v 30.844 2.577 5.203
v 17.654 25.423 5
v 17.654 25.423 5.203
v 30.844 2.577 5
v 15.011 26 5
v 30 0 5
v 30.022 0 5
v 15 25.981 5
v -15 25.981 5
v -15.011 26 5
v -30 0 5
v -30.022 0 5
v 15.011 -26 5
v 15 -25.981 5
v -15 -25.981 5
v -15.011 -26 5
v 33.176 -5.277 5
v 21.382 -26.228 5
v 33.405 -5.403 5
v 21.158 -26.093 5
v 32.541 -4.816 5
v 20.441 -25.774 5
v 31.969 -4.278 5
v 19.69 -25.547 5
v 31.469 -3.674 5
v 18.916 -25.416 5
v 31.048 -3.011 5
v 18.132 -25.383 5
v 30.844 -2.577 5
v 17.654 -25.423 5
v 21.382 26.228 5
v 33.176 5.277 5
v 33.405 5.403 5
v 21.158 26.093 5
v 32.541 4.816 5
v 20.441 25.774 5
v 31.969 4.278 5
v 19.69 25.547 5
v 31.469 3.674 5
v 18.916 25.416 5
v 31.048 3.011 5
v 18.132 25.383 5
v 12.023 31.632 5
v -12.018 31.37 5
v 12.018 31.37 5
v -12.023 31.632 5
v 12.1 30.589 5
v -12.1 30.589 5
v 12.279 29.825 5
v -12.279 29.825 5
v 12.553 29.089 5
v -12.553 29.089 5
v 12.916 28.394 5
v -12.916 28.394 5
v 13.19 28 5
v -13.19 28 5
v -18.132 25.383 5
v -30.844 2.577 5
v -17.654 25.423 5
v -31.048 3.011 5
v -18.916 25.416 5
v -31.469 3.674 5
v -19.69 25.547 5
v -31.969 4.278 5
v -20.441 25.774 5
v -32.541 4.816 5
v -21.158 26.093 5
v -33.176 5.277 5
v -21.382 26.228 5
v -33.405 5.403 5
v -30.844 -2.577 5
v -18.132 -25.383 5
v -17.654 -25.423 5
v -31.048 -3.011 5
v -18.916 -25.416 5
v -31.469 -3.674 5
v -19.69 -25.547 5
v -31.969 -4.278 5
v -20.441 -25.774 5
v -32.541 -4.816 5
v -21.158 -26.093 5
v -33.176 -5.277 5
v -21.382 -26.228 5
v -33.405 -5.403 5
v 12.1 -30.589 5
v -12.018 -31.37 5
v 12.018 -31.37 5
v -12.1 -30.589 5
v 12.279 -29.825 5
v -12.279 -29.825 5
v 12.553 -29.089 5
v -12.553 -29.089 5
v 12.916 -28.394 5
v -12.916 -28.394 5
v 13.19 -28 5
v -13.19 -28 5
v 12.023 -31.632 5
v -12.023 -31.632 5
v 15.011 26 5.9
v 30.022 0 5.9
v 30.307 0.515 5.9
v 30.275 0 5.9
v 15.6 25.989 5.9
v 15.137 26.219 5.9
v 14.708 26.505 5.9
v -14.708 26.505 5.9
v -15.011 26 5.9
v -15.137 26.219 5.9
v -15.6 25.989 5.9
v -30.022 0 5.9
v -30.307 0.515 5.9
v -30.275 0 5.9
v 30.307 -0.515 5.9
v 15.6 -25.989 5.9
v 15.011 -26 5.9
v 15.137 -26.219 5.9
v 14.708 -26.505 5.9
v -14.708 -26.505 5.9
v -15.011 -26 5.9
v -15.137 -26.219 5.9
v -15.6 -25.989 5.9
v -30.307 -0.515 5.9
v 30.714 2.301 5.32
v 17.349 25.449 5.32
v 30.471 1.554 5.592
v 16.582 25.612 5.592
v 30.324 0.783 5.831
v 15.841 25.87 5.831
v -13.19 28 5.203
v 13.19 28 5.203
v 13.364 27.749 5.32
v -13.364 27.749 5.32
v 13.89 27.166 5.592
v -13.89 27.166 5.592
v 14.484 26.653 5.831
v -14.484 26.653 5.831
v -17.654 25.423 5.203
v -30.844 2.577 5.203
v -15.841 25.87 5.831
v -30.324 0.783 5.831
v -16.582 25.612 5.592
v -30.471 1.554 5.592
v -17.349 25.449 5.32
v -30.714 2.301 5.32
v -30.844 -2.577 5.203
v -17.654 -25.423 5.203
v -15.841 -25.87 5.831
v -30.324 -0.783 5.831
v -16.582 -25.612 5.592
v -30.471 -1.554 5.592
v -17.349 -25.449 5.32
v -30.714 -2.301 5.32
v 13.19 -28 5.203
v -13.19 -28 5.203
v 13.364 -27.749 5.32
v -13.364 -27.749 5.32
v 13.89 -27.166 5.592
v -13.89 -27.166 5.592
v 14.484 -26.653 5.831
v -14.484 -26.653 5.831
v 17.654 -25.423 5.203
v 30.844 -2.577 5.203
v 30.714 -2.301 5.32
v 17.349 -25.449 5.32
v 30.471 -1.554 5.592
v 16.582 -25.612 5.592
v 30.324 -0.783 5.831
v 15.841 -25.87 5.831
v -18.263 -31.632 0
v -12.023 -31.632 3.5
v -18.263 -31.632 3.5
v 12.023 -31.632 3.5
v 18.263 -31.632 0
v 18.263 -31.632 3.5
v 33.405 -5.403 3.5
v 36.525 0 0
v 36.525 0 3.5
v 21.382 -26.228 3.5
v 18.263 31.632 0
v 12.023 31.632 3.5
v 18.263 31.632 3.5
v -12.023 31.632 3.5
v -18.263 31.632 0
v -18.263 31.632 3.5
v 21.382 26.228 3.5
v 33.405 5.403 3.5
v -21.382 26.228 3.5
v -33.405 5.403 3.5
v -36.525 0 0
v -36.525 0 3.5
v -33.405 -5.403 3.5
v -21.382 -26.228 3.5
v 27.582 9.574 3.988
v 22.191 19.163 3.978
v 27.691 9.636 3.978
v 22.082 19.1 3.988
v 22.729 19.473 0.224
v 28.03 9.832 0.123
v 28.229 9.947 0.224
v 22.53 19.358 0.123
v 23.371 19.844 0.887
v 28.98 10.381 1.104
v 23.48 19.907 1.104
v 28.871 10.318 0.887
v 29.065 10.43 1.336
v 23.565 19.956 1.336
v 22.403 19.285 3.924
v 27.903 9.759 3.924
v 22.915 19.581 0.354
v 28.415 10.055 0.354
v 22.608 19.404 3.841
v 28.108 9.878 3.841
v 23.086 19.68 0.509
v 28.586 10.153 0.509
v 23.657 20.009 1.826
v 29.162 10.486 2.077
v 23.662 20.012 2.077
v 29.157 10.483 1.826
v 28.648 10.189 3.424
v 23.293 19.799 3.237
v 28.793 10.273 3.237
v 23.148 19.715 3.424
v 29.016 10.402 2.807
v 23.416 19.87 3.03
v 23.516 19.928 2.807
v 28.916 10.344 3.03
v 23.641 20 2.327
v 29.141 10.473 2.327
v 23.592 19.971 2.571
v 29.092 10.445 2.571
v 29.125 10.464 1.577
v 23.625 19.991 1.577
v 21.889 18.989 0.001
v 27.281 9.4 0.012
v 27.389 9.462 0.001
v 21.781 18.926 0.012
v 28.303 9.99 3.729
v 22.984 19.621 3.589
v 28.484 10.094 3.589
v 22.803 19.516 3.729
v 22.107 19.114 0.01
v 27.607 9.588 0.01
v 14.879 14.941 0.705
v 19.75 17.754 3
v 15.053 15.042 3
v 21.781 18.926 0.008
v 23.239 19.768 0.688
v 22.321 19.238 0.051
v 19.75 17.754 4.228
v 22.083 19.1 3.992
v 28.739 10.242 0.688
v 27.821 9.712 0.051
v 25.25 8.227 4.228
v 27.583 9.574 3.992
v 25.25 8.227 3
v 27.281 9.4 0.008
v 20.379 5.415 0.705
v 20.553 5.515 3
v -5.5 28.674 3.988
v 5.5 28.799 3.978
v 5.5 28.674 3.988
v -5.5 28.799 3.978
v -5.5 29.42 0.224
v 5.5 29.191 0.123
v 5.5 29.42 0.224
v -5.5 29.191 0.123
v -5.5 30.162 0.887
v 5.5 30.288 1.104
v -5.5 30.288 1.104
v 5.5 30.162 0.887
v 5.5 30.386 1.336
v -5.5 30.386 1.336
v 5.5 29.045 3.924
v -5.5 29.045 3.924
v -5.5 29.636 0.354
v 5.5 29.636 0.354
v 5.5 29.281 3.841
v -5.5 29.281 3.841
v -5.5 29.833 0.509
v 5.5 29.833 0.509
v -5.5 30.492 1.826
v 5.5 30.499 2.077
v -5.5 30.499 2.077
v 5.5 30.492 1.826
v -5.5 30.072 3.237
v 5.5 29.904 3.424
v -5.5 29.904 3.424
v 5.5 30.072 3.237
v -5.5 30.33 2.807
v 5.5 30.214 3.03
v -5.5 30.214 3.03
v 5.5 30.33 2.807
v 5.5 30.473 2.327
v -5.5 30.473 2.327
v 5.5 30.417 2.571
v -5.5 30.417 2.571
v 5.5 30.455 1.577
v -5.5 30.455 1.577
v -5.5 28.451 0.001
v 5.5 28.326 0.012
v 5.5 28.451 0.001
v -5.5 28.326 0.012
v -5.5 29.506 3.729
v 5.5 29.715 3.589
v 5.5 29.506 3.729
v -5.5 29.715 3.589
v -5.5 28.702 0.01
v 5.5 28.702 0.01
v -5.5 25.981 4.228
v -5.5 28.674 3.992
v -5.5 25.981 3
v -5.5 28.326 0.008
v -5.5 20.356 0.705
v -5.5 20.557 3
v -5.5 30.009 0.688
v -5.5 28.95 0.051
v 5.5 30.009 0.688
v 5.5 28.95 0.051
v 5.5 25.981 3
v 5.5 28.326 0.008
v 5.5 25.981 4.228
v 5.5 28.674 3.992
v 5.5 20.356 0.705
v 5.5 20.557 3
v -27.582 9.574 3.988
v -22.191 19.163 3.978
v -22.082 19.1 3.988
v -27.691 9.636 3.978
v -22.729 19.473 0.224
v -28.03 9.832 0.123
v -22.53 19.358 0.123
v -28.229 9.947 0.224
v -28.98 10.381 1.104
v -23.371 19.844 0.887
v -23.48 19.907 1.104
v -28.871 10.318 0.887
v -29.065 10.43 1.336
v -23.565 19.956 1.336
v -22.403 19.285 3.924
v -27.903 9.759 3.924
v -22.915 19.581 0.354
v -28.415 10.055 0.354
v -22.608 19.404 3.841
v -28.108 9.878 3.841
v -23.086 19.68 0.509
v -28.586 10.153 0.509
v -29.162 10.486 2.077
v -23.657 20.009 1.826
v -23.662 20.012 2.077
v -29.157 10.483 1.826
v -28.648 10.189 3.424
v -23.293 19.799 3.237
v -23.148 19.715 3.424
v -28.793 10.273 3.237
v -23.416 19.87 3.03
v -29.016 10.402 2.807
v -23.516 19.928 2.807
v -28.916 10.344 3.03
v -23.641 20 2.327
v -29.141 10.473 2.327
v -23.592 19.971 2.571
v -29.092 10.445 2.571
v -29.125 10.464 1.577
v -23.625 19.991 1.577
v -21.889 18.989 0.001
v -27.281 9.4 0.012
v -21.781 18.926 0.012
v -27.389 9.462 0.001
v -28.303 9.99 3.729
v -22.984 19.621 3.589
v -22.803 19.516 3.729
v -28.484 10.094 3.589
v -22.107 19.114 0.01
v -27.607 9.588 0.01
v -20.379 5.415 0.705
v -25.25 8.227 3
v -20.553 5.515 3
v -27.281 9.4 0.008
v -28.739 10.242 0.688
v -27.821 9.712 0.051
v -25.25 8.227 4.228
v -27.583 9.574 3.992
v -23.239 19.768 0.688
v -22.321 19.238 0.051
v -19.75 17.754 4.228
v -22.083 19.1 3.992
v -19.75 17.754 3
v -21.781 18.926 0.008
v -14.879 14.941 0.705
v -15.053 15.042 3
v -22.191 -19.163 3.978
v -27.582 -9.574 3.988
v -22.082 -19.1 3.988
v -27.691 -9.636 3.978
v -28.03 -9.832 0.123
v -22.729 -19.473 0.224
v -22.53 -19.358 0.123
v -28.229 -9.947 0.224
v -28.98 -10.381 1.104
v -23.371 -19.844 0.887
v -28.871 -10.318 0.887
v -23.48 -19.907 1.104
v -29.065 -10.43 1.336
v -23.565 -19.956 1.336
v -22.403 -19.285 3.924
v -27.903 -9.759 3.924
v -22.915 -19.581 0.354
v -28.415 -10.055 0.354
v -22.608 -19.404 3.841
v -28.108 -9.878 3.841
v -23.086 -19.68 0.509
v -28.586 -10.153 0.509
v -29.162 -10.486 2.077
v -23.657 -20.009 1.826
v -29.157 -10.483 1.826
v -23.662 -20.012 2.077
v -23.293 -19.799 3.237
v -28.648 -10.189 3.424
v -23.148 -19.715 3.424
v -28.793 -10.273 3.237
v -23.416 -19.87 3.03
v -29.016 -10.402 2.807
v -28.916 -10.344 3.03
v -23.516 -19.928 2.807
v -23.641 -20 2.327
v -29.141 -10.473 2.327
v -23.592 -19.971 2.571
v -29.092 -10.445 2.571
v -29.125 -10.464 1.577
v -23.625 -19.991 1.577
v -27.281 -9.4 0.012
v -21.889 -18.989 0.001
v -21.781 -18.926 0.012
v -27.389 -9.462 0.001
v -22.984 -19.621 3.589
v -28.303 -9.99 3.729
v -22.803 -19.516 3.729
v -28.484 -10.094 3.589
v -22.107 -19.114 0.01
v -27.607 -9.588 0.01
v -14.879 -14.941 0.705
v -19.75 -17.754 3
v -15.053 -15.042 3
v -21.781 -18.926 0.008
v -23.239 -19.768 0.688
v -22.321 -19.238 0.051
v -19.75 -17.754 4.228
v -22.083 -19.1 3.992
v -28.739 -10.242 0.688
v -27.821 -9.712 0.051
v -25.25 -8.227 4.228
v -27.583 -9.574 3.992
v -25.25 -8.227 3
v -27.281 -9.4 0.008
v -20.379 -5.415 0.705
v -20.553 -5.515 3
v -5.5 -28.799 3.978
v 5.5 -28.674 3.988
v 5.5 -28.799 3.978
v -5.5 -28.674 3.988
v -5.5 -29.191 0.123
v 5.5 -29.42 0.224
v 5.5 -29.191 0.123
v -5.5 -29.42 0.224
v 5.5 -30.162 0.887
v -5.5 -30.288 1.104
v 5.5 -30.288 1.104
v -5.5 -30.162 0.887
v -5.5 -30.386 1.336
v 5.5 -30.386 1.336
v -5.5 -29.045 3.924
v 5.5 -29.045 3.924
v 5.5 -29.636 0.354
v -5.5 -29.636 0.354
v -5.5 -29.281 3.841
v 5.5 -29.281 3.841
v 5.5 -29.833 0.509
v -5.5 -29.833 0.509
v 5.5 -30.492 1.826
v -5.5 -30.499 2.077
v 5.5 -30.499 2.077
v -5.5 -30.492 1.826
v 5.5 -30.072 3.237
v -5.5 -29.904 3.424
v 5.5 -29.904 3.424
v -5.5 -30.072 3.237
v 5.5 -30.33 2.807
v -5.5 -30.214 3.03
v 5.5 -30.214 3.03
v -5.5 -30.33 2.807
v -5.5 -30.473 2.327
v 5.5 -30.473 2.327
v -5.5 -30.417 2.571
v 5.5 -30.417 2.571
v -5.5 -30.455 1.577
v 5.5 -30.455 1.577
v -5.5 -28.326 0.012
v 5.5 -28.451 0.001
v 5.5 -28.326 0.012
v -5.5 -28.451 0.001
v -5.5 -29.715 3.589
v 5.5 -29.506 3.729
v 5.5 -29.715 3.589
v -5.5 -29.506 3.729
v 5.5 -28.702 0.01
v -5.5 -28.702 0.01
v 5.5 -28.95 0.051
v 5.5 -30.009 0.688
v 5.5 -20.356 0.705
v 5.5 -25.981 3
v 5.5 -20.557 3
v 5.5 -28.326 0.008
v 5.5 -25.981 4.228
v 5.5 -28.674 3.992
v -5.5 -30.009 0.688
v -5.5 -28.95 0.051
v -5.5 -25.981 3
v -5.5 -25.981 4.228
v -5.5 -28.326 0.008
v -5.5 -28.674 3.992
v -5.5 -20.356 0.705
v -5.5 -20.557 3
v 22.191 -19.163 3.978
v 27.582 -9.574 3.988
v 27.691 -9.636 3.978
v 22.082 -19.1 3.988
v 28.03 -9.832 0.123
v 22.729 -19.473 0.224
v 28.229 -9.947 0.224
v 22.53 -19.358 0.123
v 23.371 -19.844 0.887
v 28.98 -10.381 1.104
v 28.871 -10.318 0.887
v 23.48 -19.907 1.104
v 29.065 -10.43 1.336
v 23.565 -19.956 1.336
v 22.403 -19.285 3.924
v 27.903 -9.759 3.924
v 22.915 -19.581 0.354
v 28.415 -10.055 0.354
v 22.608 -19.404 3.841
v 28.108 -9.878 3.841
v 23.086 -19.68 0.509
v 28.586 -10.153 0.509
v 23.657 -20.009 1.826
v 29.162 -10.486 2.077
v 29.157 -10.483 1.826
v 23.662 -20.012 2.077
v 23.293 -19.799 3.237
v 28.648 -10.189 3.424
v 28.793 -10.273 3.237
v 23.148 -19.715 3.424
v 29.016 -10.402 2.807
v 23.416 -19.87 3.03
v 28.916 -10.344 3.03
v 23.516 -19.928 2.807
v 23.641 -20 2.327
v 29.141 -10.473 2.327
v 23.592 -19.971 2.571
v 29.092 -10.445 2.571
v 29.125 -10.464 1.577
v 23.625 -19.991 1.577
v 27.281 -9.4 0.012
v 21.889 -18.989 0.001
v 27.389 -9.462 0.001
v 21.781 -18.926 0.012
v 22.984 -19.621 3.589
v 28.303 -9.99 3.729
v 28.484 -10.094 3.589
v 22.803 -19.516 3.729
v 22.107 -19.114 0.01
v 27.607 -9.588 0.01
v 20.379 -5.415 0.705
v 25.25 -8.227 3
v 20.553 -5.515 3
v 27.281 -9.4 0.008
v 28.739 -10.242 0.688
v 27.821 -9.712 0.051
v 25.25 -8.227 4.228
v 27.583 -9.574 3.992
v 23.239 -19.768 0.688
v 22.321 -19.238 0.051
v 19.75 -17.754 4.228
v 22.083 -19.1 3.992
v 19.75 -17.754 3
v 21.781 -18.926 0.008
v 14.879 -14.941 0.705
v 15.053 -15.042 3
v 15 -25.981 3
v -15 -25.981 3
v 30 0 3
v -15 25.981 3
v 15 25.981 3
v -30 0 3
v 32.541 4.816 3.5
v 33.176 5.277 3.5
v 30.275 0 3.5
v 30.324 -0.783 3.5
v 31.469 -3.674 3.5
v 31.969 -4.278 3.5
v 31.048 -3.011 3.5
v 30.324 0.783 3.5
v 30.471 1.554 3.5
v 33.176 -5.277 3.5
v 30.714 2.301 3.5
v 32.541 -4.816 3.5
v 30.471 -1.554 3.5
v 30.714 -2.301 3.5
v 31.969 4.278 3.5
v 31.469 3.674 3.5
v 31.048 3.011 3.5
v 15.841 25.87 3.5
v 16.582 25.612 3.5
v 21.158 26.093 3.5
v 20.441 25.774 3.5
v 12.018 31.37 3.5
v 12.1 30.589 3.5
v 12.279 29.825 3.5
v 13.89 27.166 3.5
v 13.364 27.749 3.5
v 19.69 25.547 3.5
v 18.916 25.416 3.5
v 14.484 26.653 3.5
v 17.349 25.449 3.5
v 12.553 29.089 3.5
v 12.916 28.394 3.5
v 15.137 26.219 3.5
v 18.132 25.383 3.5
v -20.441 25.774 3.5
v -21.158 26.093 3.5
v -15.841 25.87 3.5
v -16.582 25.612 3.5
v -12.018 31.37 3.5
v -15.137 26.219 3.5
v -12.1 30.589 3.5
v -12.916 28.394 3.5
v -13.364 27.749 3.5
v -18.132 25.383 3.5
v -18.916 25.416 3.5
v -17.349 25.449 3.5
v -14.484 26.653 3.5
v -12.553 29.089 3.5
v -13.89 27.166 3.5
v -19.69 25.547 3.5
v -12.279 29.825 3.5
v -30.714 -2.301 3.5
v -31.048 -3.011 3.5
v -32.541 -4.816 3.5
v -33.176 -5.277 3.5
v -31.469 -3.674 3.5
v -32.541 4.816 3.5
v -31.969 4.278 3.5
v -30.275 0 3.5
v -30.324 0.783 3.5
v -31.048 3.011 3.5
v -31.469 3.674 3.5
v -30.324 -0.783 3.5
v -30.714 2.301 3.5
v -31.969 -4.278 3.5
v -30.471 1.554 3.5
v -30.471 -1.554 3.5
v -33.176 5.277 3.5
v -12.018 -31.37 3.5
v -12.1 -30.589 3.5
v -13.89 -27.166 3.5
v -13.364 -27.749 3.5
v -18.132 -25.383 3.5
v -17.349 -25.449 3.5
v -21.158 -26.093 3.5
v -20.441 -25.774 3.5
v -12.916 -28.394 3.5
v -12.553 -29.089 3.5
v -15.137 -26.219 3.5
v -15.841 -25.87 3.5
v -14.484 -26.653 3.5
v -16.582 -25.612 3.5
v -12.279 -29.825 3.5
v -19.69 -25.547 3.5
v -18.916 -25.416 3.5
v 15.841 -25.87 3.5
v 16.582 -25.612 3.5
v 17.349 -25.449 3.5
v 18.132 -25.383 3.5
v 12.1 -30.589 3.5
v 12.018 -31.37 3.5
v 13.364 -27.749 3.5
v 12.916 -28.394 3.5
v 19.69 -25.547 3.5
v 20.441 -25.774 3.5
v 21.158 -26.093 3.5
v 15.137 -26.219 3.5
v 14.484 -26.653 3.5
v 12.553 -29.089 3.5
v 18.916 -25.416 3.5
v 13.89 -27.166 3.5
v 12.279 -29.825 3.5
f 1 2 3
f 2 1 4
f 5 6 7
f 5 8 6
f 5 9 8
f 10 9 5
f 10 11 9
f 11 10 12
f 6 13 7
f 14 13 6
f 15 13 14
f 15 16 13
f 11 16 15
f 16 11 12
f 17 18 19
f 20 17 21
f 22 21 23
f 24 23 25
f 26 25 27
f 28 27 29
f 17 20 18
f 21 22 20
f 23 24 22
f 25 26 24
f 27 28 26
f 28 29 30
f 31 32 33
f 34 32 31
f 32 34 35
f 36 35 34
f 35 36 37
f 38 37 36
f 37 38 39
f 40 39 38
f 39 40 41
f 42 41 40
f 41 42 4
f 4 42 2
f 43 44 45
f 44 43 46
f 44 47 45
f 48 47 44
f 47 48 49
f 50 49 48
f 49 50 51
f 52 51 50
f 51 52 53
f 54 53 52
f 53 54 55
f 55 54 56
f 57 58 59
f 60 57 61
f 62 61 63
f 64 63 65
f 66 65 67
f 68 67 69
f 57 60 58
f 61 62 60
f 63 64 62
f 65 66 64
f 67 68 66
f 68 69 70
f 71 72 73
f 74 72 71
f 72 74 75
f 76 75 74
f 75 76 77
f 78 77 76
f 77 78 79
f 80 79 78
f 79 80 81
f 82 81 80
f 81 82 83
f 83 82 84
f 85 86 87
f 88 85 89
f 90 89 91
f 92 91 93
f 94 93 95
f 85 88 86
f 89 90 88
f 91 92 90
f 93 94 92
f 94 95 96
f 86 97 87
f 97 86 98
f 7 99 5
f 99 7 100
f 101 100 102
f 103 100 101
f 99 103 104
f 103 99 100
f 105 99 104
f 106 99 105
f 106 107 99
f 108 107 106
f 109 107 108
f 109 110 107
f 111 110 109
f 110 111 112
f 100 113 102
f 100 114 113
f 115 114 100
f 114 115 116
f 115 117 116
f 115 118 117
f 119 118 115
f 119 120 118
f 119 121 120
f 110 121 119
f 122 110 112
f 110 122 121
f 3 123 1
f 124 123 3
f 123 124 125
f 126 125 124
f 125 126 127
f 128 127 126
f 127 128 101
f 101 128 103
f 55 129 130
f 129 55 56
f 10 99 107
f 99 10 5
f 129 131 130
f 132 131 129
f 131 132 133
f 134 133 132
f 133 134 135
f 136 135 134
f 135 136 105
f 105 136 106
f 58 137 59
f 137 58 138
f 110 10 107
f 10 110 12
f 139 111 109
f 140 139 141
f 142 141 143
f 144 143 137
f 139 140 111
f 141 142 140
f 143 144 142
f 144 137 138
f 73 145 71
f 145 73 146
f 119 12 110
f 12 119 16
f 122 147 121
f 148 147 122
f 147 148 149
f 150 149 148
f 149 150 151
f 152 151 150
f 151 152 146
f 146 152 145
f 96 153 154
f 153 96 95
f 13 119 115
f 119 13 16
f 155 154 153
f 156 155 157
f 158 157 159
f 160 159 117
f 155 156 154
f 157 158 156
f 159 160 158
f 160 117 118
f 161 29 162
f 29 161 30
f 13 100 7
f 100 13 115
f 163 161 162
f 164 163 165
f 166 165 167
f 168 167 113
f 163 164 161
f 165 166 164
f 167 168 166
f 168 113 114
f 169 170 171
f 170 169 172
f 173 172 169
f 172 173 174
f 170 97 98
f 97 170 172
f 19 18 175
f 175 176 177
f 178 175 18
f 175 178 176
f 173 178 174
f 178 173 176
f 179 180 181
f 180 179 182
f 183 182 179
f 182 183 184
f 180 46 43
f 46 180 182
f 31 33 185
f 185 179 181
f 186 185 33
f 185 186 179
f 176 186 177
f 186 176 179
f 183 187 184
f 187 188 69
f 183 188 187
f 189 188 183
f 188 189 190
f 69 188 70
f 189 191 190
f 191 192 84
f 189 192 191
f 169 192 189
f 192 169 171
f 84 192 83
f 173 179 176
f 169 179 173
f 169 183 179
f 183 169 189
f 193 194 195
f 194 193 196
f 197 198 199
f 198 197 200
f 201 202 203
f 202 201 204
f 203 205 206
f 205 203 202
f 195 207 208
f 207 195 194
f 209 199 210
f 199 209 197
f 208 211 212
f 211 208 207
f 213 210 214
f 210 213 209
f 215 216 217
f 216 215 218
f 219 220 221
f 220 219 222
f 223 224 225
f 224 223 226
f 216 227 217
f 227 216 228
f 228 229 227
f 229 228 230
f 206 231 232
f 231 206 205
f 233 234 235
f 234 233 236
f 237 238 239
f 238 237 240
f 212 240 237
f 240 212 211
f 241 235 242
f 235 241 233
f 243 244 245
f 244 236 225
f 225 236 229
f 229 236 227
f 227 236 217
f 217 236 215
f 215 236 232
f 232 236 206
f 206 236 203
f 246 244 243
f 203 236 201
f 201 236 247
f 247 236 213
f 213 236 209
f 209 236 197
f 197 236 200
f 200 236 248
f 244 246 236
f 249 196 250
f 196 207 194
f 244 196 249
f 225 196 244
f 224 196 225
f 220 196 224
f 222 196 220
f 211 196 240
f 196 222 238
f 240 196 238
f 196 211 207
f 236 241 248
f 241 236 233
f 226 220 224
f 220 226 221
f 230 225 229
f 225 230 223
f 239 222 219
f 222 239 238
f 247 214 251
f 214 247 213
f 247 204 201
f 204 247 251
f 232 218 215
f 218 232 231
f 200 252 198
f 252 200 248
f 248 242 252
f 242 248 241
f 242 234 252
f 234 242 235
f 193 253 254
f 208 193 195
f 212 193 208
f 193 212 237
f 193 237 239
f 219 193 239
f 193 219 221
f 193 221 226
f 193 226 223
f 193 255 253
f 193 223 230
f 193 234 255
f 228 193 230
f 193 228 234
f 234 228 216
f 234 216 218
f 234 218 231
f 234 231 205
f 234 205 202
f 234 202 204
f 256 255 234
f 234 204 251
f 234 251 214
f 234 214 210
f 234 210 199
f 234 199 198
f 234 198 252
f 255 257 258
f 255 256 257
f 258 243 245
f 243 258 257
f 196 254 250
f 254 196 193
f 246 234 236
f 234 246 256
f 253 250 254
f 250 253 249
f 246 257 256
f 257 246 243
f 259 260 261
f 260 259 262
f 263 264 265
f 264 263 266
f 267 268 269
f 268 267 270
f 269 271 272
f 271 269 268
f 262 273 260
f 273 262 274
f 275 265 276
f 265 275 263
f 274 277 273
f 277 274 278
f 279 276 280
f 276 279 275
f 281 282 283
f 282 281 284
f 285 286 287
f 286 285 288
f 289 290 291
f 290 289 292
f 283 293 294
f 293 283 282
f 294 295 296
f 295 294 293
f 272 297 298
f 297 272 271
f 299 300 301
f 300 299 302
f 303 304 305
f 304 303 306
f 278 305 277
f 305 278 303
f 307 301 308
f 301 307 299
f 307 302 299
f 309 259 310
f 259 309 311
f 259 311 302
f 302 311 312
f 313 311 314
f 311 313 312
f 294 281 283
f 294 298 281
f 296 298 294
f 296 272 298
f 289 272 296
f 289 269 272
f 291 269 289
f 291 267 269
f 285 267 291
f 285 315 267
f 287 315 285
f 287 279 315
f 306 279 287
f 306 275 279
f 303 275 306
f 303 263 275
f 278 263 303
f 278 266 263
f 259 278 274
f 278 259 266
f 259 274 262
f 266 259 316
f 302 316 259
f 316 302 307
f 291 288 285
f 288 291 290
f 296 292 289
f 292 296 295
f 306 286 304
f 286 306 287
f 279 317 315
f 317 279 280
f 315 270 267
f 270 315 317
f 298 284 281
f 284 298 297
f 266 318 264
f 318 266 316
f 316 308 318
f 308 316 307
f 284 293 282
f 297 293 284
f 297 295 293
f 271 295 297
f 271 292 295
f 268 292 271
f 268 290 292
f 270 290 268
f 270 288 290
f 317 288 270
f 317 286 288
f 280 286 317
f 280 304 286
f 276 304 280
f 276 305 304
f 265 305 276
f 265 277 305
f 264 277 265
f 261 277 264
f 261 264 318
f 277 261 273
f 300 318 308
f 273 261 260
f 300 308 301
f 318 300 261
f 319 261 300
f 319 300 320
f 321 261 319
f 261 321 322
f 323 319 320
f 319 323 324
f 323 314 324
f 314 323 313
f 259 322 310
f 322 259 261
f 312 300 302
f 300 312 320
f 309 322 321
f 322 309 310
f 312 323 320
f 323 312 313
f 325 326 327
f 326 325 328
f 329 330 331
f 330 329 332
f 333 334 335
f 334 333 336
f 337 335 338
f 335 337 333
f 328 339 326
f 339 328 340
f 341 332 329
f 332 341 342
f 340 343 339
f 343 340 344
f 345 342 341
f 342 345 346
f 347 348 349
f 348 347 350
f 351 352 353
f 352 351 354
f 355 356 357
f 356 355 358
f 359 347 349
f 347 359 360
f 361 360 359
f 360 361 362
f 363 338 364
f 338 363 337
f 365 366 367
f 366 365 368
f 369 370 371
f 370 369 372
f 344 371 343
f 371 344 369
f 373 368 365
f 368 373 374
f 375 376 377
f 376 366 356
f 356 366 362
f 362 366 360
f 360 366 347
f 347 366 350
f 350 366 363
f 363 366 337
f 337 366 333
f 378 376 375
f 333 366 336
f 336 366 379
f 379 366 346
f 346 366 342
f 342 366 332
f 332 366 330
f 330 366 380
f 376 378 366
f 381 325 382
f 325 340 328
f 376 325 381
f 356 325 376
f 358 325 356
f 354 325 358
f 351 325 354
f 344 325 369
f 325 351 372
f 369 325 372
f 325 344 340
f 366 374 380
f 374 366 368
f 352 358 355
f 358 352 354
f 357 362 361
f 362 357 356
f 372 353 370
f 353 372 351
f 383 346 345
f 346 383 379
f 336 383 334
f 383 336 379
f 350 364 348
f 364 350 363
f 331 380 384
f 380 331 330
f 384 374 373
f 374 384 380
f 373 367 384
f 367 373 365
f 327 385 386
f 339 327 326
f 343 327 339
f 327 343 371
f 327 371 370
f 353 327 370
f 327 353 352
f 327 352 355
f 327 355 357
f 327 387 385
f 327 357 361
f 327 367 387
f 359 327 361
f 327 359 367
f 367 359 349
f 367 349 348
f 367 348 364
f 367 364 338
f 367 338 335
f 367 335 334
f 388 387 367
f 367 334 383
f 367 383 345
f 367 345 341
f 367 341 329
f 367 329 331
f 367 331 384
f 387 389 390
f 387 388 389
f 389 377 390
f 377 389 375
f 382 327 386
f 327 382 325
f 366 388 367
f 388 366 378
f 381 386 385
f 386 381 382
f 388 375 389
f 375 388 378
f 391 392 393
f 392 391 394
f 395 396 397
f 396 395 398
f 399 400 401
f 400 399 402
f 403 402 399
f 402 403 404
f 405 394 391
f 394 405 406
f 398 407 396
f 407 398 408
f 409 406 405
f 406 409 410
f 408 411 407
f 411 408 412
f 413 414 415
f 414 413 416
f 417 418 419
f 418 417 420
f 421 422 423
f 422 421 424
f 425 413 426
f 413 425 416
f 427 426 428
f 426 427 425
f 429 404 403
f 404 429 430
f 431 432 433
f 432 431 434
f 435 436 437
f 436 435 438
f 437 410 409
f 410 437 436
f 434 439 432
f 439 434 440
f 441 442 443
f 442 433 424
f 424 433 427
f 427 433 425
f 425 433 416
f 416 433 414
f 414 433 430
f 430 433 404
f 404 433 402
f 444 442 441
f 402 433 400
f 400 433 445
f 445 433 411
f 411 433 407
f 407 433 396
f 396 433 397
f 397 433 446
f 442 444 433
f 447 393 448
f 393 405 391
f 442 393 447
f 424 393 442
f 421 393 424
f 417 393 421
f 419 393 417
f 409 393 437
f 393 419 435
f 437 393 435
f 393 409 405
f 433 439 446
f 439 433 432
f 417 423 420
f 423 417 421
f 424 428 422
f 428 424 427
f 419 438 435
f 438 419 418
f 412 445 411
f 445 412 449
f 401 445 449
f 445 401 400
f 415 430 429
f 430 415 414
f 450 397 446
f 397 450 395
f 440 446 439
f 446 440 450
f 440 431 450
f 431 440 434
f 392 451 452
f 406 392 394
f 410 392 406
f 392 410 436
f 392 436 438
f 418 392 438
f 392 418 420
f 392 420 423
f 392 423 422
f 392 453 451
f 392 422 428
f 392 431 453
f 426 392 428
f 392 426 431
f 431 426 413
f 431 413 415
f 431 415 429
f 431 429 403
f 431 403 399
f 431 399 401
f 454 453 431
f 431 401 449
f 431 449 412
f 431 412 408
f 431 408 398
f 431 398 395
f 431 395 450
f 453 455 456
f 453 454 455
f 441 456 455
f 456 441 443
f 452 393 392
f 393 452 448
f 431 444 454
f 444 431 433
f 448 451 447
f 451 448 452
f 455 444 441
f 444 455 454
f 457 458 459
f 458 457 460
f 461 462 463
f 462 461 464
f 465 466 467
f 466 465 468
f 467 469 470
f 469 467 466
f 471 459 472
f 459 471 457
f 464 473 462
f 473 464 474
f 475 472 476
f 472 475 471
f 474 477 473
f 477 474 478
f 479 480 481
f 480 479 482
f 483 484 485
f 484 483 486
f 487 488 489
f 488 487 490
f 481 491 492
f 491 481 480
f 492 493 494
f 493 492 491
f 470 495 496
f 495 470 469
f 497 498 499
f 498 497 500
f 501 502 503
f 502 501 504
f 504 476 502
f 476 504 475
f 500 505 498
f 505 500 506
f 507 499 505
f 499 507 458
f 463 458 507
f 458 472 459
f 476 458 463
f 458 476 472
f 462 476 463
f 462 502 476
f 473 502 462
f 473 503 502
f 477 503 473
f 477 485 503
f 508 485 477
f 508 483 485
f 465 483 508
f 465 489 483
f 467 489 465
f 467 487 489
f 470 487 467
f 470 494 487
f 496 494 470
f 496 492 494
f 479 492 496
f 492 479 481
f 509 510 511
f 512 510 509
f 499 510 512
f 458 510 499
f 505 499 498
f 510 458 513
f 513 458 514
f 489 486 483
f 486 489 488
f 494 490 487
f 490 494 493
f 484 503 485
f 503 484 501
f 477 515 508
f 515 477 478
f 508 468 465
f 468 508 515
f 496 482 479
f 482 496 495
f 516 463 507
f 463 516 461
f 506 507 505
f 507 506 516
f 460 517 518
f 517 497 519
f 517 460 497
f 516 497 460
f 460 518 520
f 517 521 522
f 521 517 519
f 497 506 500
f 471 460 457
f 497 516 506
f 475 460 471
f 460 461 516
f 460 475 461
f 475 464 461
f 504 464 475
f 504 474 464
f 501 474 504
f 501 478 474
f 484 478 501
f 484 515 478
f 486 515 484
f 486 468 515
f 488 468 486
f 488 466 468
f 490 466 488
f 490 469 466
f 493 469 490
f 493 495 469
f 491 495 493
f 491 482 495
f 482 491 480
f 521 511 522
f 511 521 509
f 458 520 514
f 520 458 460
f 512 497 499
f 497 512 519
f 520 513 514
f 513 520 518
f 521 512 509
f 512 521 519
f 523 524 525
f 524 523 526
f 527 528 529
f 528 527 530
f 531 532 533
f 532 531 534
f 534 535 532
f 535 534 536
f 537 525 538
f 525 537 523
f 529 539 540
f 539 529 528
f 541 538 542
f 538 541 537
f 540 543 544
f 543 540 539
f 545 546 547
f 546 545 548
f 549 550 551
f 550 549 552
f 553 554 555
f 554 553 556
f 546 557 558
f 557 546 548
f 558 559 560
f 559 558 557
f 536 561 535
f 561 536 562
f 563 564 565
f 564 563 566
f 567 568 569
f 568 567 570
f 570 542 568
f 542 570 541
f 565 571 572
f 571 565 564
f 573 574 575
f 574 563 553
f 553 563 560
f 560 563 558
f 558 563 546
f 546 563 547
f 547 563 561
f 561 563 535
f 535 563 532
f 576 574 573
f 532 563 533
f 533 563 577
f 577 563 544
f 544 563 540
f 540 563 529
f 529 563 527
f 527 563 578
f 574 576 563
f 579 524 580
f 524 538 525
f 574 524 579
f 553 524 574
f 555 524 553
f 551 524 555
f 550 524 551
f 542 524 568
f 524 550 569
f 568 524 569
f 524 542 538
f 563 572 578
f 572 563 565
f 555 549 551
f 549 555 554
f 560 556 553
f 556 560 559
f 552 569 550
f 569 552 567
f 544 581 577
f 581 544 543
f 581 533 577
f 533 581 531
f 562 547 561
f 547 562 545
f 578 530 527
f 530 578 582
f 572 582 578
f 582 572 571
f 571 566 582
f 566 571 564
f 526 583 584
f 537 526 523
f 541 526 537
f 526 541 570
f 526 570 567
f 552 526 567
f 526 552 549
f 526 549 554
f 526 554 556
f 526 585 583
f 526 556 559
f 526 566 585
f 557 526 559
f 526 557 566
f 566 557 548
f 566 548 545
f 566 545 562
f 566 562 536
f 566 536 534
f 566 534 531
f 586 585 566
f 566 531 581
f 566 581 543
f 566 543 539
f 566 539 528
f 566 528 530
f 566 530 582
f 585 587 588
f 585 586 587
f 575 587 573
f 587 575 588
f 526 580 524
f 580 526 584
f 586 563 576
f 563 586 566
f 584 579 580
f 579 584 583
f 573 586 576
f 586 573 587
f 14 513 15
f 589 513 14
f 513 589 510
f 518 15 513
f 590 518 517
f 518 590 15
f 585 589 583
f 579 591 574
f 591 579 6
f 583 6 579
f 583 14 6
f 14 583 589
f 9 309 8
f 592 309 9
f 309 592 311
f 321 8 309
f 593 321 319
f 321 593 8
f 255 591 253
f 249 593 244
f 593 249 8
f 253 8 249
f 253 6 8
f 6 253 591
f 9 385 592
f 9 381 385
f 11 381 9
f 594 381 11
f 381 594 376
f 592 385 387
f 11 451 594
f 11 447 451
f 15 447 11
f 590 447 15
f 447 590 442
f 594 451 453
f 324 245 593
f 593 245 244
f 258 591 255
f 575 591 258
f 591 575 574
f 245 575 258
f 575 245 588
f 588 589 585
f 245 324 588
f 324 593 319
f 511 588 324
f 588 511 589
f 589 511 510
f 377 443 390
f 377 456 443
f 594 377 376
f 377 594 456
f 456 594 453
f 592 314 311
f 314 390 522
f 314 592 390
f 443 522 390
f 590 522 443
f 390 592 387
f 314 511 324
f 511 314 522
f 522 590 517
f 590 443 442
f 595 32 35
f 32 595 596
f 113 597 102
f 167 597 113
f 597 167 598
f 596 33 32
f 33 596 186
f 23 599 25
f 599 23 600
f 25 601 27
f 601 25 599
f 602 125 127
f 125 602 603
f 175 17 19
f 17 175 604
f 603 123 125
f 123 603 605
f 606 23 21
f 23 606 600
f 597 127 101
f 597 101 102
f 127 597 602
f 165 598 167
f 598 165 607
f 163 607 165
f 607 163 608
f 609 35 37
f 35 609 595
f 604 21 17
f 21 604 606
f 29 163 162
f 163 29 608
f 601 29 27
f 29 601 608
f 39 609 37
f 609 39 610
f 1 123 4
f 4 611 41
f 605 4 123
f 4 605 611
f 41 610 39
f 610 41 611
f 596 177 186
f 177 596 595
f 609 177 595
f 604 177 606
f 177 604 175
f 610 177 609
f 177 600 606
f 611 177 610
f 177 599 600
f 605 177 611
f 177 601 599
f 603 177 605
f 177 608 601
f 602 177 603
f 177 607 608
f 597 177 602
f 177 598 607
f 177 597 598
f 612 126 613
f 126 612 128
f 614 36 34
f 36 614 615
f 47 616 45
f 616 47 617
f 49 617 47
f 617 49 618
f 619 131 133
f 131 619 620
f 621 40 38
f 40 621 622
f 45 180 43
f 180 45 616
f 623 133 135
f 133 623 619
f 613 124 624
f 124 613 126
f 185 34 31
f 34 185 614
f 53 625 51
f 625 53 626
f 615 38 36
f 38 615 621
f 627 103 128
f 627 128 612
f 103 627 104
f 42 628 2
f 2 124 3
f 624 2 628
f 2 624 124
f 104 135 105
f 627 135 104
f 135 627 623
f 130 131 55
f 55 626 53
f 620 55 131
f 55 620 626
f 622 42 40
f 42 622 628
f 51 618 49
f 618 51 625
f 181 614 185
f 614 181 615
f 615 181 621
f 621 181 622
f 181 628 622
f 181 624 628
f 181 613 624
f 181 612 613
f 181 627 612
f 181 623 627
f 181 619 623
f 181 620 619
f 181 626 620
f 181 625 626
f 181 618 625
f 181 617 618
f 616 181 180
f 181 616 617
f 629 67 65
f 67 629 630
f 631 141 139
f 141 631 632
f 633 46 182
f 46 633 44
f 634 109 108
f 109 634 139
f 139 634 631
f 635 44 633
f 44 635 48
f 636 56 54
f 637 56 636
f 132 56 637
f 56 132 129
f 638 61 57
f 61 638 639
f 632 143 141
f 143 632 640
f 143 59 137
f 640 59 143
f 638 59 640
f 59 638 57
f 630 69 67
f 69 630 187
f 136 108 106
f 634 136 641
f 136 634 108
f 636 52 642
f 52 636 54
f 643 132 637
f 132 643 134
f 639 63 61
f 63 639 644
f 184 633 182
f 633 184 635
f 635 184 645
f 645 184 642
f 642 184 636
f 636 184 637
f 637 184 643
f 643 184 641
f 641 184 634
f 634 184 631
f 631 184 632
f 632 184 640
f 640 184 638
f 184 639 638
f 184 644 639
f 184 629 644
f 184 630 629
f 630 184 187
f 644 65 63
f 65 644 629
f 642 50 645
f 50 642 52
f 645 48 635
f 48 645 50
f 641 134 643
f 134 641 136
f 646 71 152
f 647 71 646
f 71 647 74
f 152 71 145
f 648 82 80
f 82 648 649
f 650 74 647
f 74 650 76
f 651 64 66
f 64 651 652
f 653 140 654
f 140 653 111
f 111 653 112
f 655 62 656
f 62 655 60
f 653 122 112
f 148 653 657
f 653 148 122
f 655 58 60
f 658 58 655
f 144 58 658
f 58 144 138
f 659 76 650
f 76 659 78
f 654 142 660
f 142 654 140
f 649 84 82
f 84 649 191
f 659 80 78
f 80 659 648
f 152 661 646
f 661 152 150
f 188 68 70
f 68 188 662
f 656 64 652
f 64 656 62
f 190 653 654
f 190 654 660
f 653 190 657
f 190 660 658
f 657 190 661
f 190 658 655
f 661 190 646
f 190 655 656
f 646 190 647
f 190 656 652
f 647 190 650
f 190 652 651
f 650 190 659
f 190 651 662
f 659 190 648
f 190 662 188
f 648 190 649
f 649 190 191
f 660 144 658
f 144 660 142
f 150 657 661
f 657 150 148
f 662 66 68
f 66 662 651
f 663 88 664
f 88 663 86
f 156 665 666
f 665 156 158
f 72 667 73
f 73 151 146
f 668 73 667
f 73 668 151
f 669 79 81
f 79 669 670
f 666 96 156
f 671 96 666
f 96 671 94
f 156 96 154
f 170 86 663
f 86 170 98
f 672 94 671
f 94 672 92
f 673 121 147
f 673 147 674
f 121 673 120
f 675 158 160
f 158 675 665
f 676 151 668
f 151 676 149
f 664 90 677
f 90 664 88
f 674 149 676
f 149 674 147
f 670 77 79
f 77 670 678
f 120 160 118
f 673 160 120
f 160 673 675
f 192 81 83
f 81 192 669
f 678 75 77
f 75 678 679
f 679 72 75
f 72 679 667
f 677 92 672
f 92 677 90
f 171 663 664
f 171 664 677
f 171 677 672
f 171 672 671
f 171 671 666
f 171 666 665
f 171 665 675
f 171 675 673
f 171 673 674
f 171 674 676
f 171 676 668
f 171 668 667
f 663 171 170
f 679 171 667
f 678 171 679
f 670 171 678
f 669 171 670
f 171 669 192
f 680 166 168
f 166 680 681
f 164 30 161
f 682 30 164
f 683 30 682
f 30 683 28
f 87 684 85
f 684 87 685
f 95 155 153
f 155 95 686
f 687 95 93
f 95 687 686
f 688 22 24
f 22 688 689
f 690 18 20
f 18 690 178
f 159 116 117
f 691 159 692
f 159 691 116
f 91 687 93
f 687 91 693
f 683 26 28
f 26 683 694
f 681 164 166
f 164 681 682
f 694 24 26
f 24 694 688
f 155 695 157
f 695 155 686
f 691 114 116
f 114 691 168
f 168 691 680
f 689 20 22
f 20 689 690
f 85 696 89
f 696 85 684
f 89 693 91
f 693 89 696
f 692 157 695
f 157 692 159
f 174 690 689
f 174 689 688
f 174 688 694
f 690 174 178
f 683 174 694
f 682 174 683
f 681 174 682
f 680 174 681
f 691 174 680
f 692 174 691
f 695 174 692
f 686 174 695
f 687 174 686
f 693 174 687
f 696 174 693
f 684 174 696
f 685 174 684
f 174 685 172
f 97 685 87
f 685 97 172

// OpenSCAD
H = 5;
INNER_RADIUS = 30;

difference() {
  union() {
    cylinder(r=36.525, h=H, $fn=6);

    hex_edge(30);
    hex_edge(90);
    hex_edge(150);
    hex_edge(210);
    hex_edge(270);
    hex_edge(330);
  }
  
  translate([0, 0, H - 2])
    cylinder(r=INNER_RADIUS, h=H, $fn=6);

  corner(0);
  corner(60);
  corner(120);
  corner(180);
  corner(240);
  corner(300);

  magnet(30);
  magnet(90);
  magnet(150);
  magnet(210);
  magnet(270);
  magnet(330);
}


module hex_edge(rot) {
    rotate([0, 0, rot]) 
      translate([INNER_RADIUS - 3, 0, H + 1])
        difference() {
          cube(size=[2, 30.5, 2], center = true);

          translate([0, 0, 0.9])
            cube(size=[3, 50, 2], center = true);

          rotate([0, 25, 0]) 
            translate([1, 0, 0.7])
              cube(size=[5, 50, 2], center = true);
        }
}

module corner(rot) {
  rotate([0, 0, rot]) 
    translate([36.525, 0, H - 1.5])
      cylinder(h = 3, r = 6.25, $fn=50);
}

module magnet(rot) {
  rotate([0, 0, rot]) {
    translate([28.5, -5.5, 2]) {
      rotate([90, 355, 180]) {
        cylinder(h = 11, r = 2, $fn=50);

        translate([4, 0, 5.5])
          cube(size=[8, 4, 11], center = true);
      }
    }
  }
}
